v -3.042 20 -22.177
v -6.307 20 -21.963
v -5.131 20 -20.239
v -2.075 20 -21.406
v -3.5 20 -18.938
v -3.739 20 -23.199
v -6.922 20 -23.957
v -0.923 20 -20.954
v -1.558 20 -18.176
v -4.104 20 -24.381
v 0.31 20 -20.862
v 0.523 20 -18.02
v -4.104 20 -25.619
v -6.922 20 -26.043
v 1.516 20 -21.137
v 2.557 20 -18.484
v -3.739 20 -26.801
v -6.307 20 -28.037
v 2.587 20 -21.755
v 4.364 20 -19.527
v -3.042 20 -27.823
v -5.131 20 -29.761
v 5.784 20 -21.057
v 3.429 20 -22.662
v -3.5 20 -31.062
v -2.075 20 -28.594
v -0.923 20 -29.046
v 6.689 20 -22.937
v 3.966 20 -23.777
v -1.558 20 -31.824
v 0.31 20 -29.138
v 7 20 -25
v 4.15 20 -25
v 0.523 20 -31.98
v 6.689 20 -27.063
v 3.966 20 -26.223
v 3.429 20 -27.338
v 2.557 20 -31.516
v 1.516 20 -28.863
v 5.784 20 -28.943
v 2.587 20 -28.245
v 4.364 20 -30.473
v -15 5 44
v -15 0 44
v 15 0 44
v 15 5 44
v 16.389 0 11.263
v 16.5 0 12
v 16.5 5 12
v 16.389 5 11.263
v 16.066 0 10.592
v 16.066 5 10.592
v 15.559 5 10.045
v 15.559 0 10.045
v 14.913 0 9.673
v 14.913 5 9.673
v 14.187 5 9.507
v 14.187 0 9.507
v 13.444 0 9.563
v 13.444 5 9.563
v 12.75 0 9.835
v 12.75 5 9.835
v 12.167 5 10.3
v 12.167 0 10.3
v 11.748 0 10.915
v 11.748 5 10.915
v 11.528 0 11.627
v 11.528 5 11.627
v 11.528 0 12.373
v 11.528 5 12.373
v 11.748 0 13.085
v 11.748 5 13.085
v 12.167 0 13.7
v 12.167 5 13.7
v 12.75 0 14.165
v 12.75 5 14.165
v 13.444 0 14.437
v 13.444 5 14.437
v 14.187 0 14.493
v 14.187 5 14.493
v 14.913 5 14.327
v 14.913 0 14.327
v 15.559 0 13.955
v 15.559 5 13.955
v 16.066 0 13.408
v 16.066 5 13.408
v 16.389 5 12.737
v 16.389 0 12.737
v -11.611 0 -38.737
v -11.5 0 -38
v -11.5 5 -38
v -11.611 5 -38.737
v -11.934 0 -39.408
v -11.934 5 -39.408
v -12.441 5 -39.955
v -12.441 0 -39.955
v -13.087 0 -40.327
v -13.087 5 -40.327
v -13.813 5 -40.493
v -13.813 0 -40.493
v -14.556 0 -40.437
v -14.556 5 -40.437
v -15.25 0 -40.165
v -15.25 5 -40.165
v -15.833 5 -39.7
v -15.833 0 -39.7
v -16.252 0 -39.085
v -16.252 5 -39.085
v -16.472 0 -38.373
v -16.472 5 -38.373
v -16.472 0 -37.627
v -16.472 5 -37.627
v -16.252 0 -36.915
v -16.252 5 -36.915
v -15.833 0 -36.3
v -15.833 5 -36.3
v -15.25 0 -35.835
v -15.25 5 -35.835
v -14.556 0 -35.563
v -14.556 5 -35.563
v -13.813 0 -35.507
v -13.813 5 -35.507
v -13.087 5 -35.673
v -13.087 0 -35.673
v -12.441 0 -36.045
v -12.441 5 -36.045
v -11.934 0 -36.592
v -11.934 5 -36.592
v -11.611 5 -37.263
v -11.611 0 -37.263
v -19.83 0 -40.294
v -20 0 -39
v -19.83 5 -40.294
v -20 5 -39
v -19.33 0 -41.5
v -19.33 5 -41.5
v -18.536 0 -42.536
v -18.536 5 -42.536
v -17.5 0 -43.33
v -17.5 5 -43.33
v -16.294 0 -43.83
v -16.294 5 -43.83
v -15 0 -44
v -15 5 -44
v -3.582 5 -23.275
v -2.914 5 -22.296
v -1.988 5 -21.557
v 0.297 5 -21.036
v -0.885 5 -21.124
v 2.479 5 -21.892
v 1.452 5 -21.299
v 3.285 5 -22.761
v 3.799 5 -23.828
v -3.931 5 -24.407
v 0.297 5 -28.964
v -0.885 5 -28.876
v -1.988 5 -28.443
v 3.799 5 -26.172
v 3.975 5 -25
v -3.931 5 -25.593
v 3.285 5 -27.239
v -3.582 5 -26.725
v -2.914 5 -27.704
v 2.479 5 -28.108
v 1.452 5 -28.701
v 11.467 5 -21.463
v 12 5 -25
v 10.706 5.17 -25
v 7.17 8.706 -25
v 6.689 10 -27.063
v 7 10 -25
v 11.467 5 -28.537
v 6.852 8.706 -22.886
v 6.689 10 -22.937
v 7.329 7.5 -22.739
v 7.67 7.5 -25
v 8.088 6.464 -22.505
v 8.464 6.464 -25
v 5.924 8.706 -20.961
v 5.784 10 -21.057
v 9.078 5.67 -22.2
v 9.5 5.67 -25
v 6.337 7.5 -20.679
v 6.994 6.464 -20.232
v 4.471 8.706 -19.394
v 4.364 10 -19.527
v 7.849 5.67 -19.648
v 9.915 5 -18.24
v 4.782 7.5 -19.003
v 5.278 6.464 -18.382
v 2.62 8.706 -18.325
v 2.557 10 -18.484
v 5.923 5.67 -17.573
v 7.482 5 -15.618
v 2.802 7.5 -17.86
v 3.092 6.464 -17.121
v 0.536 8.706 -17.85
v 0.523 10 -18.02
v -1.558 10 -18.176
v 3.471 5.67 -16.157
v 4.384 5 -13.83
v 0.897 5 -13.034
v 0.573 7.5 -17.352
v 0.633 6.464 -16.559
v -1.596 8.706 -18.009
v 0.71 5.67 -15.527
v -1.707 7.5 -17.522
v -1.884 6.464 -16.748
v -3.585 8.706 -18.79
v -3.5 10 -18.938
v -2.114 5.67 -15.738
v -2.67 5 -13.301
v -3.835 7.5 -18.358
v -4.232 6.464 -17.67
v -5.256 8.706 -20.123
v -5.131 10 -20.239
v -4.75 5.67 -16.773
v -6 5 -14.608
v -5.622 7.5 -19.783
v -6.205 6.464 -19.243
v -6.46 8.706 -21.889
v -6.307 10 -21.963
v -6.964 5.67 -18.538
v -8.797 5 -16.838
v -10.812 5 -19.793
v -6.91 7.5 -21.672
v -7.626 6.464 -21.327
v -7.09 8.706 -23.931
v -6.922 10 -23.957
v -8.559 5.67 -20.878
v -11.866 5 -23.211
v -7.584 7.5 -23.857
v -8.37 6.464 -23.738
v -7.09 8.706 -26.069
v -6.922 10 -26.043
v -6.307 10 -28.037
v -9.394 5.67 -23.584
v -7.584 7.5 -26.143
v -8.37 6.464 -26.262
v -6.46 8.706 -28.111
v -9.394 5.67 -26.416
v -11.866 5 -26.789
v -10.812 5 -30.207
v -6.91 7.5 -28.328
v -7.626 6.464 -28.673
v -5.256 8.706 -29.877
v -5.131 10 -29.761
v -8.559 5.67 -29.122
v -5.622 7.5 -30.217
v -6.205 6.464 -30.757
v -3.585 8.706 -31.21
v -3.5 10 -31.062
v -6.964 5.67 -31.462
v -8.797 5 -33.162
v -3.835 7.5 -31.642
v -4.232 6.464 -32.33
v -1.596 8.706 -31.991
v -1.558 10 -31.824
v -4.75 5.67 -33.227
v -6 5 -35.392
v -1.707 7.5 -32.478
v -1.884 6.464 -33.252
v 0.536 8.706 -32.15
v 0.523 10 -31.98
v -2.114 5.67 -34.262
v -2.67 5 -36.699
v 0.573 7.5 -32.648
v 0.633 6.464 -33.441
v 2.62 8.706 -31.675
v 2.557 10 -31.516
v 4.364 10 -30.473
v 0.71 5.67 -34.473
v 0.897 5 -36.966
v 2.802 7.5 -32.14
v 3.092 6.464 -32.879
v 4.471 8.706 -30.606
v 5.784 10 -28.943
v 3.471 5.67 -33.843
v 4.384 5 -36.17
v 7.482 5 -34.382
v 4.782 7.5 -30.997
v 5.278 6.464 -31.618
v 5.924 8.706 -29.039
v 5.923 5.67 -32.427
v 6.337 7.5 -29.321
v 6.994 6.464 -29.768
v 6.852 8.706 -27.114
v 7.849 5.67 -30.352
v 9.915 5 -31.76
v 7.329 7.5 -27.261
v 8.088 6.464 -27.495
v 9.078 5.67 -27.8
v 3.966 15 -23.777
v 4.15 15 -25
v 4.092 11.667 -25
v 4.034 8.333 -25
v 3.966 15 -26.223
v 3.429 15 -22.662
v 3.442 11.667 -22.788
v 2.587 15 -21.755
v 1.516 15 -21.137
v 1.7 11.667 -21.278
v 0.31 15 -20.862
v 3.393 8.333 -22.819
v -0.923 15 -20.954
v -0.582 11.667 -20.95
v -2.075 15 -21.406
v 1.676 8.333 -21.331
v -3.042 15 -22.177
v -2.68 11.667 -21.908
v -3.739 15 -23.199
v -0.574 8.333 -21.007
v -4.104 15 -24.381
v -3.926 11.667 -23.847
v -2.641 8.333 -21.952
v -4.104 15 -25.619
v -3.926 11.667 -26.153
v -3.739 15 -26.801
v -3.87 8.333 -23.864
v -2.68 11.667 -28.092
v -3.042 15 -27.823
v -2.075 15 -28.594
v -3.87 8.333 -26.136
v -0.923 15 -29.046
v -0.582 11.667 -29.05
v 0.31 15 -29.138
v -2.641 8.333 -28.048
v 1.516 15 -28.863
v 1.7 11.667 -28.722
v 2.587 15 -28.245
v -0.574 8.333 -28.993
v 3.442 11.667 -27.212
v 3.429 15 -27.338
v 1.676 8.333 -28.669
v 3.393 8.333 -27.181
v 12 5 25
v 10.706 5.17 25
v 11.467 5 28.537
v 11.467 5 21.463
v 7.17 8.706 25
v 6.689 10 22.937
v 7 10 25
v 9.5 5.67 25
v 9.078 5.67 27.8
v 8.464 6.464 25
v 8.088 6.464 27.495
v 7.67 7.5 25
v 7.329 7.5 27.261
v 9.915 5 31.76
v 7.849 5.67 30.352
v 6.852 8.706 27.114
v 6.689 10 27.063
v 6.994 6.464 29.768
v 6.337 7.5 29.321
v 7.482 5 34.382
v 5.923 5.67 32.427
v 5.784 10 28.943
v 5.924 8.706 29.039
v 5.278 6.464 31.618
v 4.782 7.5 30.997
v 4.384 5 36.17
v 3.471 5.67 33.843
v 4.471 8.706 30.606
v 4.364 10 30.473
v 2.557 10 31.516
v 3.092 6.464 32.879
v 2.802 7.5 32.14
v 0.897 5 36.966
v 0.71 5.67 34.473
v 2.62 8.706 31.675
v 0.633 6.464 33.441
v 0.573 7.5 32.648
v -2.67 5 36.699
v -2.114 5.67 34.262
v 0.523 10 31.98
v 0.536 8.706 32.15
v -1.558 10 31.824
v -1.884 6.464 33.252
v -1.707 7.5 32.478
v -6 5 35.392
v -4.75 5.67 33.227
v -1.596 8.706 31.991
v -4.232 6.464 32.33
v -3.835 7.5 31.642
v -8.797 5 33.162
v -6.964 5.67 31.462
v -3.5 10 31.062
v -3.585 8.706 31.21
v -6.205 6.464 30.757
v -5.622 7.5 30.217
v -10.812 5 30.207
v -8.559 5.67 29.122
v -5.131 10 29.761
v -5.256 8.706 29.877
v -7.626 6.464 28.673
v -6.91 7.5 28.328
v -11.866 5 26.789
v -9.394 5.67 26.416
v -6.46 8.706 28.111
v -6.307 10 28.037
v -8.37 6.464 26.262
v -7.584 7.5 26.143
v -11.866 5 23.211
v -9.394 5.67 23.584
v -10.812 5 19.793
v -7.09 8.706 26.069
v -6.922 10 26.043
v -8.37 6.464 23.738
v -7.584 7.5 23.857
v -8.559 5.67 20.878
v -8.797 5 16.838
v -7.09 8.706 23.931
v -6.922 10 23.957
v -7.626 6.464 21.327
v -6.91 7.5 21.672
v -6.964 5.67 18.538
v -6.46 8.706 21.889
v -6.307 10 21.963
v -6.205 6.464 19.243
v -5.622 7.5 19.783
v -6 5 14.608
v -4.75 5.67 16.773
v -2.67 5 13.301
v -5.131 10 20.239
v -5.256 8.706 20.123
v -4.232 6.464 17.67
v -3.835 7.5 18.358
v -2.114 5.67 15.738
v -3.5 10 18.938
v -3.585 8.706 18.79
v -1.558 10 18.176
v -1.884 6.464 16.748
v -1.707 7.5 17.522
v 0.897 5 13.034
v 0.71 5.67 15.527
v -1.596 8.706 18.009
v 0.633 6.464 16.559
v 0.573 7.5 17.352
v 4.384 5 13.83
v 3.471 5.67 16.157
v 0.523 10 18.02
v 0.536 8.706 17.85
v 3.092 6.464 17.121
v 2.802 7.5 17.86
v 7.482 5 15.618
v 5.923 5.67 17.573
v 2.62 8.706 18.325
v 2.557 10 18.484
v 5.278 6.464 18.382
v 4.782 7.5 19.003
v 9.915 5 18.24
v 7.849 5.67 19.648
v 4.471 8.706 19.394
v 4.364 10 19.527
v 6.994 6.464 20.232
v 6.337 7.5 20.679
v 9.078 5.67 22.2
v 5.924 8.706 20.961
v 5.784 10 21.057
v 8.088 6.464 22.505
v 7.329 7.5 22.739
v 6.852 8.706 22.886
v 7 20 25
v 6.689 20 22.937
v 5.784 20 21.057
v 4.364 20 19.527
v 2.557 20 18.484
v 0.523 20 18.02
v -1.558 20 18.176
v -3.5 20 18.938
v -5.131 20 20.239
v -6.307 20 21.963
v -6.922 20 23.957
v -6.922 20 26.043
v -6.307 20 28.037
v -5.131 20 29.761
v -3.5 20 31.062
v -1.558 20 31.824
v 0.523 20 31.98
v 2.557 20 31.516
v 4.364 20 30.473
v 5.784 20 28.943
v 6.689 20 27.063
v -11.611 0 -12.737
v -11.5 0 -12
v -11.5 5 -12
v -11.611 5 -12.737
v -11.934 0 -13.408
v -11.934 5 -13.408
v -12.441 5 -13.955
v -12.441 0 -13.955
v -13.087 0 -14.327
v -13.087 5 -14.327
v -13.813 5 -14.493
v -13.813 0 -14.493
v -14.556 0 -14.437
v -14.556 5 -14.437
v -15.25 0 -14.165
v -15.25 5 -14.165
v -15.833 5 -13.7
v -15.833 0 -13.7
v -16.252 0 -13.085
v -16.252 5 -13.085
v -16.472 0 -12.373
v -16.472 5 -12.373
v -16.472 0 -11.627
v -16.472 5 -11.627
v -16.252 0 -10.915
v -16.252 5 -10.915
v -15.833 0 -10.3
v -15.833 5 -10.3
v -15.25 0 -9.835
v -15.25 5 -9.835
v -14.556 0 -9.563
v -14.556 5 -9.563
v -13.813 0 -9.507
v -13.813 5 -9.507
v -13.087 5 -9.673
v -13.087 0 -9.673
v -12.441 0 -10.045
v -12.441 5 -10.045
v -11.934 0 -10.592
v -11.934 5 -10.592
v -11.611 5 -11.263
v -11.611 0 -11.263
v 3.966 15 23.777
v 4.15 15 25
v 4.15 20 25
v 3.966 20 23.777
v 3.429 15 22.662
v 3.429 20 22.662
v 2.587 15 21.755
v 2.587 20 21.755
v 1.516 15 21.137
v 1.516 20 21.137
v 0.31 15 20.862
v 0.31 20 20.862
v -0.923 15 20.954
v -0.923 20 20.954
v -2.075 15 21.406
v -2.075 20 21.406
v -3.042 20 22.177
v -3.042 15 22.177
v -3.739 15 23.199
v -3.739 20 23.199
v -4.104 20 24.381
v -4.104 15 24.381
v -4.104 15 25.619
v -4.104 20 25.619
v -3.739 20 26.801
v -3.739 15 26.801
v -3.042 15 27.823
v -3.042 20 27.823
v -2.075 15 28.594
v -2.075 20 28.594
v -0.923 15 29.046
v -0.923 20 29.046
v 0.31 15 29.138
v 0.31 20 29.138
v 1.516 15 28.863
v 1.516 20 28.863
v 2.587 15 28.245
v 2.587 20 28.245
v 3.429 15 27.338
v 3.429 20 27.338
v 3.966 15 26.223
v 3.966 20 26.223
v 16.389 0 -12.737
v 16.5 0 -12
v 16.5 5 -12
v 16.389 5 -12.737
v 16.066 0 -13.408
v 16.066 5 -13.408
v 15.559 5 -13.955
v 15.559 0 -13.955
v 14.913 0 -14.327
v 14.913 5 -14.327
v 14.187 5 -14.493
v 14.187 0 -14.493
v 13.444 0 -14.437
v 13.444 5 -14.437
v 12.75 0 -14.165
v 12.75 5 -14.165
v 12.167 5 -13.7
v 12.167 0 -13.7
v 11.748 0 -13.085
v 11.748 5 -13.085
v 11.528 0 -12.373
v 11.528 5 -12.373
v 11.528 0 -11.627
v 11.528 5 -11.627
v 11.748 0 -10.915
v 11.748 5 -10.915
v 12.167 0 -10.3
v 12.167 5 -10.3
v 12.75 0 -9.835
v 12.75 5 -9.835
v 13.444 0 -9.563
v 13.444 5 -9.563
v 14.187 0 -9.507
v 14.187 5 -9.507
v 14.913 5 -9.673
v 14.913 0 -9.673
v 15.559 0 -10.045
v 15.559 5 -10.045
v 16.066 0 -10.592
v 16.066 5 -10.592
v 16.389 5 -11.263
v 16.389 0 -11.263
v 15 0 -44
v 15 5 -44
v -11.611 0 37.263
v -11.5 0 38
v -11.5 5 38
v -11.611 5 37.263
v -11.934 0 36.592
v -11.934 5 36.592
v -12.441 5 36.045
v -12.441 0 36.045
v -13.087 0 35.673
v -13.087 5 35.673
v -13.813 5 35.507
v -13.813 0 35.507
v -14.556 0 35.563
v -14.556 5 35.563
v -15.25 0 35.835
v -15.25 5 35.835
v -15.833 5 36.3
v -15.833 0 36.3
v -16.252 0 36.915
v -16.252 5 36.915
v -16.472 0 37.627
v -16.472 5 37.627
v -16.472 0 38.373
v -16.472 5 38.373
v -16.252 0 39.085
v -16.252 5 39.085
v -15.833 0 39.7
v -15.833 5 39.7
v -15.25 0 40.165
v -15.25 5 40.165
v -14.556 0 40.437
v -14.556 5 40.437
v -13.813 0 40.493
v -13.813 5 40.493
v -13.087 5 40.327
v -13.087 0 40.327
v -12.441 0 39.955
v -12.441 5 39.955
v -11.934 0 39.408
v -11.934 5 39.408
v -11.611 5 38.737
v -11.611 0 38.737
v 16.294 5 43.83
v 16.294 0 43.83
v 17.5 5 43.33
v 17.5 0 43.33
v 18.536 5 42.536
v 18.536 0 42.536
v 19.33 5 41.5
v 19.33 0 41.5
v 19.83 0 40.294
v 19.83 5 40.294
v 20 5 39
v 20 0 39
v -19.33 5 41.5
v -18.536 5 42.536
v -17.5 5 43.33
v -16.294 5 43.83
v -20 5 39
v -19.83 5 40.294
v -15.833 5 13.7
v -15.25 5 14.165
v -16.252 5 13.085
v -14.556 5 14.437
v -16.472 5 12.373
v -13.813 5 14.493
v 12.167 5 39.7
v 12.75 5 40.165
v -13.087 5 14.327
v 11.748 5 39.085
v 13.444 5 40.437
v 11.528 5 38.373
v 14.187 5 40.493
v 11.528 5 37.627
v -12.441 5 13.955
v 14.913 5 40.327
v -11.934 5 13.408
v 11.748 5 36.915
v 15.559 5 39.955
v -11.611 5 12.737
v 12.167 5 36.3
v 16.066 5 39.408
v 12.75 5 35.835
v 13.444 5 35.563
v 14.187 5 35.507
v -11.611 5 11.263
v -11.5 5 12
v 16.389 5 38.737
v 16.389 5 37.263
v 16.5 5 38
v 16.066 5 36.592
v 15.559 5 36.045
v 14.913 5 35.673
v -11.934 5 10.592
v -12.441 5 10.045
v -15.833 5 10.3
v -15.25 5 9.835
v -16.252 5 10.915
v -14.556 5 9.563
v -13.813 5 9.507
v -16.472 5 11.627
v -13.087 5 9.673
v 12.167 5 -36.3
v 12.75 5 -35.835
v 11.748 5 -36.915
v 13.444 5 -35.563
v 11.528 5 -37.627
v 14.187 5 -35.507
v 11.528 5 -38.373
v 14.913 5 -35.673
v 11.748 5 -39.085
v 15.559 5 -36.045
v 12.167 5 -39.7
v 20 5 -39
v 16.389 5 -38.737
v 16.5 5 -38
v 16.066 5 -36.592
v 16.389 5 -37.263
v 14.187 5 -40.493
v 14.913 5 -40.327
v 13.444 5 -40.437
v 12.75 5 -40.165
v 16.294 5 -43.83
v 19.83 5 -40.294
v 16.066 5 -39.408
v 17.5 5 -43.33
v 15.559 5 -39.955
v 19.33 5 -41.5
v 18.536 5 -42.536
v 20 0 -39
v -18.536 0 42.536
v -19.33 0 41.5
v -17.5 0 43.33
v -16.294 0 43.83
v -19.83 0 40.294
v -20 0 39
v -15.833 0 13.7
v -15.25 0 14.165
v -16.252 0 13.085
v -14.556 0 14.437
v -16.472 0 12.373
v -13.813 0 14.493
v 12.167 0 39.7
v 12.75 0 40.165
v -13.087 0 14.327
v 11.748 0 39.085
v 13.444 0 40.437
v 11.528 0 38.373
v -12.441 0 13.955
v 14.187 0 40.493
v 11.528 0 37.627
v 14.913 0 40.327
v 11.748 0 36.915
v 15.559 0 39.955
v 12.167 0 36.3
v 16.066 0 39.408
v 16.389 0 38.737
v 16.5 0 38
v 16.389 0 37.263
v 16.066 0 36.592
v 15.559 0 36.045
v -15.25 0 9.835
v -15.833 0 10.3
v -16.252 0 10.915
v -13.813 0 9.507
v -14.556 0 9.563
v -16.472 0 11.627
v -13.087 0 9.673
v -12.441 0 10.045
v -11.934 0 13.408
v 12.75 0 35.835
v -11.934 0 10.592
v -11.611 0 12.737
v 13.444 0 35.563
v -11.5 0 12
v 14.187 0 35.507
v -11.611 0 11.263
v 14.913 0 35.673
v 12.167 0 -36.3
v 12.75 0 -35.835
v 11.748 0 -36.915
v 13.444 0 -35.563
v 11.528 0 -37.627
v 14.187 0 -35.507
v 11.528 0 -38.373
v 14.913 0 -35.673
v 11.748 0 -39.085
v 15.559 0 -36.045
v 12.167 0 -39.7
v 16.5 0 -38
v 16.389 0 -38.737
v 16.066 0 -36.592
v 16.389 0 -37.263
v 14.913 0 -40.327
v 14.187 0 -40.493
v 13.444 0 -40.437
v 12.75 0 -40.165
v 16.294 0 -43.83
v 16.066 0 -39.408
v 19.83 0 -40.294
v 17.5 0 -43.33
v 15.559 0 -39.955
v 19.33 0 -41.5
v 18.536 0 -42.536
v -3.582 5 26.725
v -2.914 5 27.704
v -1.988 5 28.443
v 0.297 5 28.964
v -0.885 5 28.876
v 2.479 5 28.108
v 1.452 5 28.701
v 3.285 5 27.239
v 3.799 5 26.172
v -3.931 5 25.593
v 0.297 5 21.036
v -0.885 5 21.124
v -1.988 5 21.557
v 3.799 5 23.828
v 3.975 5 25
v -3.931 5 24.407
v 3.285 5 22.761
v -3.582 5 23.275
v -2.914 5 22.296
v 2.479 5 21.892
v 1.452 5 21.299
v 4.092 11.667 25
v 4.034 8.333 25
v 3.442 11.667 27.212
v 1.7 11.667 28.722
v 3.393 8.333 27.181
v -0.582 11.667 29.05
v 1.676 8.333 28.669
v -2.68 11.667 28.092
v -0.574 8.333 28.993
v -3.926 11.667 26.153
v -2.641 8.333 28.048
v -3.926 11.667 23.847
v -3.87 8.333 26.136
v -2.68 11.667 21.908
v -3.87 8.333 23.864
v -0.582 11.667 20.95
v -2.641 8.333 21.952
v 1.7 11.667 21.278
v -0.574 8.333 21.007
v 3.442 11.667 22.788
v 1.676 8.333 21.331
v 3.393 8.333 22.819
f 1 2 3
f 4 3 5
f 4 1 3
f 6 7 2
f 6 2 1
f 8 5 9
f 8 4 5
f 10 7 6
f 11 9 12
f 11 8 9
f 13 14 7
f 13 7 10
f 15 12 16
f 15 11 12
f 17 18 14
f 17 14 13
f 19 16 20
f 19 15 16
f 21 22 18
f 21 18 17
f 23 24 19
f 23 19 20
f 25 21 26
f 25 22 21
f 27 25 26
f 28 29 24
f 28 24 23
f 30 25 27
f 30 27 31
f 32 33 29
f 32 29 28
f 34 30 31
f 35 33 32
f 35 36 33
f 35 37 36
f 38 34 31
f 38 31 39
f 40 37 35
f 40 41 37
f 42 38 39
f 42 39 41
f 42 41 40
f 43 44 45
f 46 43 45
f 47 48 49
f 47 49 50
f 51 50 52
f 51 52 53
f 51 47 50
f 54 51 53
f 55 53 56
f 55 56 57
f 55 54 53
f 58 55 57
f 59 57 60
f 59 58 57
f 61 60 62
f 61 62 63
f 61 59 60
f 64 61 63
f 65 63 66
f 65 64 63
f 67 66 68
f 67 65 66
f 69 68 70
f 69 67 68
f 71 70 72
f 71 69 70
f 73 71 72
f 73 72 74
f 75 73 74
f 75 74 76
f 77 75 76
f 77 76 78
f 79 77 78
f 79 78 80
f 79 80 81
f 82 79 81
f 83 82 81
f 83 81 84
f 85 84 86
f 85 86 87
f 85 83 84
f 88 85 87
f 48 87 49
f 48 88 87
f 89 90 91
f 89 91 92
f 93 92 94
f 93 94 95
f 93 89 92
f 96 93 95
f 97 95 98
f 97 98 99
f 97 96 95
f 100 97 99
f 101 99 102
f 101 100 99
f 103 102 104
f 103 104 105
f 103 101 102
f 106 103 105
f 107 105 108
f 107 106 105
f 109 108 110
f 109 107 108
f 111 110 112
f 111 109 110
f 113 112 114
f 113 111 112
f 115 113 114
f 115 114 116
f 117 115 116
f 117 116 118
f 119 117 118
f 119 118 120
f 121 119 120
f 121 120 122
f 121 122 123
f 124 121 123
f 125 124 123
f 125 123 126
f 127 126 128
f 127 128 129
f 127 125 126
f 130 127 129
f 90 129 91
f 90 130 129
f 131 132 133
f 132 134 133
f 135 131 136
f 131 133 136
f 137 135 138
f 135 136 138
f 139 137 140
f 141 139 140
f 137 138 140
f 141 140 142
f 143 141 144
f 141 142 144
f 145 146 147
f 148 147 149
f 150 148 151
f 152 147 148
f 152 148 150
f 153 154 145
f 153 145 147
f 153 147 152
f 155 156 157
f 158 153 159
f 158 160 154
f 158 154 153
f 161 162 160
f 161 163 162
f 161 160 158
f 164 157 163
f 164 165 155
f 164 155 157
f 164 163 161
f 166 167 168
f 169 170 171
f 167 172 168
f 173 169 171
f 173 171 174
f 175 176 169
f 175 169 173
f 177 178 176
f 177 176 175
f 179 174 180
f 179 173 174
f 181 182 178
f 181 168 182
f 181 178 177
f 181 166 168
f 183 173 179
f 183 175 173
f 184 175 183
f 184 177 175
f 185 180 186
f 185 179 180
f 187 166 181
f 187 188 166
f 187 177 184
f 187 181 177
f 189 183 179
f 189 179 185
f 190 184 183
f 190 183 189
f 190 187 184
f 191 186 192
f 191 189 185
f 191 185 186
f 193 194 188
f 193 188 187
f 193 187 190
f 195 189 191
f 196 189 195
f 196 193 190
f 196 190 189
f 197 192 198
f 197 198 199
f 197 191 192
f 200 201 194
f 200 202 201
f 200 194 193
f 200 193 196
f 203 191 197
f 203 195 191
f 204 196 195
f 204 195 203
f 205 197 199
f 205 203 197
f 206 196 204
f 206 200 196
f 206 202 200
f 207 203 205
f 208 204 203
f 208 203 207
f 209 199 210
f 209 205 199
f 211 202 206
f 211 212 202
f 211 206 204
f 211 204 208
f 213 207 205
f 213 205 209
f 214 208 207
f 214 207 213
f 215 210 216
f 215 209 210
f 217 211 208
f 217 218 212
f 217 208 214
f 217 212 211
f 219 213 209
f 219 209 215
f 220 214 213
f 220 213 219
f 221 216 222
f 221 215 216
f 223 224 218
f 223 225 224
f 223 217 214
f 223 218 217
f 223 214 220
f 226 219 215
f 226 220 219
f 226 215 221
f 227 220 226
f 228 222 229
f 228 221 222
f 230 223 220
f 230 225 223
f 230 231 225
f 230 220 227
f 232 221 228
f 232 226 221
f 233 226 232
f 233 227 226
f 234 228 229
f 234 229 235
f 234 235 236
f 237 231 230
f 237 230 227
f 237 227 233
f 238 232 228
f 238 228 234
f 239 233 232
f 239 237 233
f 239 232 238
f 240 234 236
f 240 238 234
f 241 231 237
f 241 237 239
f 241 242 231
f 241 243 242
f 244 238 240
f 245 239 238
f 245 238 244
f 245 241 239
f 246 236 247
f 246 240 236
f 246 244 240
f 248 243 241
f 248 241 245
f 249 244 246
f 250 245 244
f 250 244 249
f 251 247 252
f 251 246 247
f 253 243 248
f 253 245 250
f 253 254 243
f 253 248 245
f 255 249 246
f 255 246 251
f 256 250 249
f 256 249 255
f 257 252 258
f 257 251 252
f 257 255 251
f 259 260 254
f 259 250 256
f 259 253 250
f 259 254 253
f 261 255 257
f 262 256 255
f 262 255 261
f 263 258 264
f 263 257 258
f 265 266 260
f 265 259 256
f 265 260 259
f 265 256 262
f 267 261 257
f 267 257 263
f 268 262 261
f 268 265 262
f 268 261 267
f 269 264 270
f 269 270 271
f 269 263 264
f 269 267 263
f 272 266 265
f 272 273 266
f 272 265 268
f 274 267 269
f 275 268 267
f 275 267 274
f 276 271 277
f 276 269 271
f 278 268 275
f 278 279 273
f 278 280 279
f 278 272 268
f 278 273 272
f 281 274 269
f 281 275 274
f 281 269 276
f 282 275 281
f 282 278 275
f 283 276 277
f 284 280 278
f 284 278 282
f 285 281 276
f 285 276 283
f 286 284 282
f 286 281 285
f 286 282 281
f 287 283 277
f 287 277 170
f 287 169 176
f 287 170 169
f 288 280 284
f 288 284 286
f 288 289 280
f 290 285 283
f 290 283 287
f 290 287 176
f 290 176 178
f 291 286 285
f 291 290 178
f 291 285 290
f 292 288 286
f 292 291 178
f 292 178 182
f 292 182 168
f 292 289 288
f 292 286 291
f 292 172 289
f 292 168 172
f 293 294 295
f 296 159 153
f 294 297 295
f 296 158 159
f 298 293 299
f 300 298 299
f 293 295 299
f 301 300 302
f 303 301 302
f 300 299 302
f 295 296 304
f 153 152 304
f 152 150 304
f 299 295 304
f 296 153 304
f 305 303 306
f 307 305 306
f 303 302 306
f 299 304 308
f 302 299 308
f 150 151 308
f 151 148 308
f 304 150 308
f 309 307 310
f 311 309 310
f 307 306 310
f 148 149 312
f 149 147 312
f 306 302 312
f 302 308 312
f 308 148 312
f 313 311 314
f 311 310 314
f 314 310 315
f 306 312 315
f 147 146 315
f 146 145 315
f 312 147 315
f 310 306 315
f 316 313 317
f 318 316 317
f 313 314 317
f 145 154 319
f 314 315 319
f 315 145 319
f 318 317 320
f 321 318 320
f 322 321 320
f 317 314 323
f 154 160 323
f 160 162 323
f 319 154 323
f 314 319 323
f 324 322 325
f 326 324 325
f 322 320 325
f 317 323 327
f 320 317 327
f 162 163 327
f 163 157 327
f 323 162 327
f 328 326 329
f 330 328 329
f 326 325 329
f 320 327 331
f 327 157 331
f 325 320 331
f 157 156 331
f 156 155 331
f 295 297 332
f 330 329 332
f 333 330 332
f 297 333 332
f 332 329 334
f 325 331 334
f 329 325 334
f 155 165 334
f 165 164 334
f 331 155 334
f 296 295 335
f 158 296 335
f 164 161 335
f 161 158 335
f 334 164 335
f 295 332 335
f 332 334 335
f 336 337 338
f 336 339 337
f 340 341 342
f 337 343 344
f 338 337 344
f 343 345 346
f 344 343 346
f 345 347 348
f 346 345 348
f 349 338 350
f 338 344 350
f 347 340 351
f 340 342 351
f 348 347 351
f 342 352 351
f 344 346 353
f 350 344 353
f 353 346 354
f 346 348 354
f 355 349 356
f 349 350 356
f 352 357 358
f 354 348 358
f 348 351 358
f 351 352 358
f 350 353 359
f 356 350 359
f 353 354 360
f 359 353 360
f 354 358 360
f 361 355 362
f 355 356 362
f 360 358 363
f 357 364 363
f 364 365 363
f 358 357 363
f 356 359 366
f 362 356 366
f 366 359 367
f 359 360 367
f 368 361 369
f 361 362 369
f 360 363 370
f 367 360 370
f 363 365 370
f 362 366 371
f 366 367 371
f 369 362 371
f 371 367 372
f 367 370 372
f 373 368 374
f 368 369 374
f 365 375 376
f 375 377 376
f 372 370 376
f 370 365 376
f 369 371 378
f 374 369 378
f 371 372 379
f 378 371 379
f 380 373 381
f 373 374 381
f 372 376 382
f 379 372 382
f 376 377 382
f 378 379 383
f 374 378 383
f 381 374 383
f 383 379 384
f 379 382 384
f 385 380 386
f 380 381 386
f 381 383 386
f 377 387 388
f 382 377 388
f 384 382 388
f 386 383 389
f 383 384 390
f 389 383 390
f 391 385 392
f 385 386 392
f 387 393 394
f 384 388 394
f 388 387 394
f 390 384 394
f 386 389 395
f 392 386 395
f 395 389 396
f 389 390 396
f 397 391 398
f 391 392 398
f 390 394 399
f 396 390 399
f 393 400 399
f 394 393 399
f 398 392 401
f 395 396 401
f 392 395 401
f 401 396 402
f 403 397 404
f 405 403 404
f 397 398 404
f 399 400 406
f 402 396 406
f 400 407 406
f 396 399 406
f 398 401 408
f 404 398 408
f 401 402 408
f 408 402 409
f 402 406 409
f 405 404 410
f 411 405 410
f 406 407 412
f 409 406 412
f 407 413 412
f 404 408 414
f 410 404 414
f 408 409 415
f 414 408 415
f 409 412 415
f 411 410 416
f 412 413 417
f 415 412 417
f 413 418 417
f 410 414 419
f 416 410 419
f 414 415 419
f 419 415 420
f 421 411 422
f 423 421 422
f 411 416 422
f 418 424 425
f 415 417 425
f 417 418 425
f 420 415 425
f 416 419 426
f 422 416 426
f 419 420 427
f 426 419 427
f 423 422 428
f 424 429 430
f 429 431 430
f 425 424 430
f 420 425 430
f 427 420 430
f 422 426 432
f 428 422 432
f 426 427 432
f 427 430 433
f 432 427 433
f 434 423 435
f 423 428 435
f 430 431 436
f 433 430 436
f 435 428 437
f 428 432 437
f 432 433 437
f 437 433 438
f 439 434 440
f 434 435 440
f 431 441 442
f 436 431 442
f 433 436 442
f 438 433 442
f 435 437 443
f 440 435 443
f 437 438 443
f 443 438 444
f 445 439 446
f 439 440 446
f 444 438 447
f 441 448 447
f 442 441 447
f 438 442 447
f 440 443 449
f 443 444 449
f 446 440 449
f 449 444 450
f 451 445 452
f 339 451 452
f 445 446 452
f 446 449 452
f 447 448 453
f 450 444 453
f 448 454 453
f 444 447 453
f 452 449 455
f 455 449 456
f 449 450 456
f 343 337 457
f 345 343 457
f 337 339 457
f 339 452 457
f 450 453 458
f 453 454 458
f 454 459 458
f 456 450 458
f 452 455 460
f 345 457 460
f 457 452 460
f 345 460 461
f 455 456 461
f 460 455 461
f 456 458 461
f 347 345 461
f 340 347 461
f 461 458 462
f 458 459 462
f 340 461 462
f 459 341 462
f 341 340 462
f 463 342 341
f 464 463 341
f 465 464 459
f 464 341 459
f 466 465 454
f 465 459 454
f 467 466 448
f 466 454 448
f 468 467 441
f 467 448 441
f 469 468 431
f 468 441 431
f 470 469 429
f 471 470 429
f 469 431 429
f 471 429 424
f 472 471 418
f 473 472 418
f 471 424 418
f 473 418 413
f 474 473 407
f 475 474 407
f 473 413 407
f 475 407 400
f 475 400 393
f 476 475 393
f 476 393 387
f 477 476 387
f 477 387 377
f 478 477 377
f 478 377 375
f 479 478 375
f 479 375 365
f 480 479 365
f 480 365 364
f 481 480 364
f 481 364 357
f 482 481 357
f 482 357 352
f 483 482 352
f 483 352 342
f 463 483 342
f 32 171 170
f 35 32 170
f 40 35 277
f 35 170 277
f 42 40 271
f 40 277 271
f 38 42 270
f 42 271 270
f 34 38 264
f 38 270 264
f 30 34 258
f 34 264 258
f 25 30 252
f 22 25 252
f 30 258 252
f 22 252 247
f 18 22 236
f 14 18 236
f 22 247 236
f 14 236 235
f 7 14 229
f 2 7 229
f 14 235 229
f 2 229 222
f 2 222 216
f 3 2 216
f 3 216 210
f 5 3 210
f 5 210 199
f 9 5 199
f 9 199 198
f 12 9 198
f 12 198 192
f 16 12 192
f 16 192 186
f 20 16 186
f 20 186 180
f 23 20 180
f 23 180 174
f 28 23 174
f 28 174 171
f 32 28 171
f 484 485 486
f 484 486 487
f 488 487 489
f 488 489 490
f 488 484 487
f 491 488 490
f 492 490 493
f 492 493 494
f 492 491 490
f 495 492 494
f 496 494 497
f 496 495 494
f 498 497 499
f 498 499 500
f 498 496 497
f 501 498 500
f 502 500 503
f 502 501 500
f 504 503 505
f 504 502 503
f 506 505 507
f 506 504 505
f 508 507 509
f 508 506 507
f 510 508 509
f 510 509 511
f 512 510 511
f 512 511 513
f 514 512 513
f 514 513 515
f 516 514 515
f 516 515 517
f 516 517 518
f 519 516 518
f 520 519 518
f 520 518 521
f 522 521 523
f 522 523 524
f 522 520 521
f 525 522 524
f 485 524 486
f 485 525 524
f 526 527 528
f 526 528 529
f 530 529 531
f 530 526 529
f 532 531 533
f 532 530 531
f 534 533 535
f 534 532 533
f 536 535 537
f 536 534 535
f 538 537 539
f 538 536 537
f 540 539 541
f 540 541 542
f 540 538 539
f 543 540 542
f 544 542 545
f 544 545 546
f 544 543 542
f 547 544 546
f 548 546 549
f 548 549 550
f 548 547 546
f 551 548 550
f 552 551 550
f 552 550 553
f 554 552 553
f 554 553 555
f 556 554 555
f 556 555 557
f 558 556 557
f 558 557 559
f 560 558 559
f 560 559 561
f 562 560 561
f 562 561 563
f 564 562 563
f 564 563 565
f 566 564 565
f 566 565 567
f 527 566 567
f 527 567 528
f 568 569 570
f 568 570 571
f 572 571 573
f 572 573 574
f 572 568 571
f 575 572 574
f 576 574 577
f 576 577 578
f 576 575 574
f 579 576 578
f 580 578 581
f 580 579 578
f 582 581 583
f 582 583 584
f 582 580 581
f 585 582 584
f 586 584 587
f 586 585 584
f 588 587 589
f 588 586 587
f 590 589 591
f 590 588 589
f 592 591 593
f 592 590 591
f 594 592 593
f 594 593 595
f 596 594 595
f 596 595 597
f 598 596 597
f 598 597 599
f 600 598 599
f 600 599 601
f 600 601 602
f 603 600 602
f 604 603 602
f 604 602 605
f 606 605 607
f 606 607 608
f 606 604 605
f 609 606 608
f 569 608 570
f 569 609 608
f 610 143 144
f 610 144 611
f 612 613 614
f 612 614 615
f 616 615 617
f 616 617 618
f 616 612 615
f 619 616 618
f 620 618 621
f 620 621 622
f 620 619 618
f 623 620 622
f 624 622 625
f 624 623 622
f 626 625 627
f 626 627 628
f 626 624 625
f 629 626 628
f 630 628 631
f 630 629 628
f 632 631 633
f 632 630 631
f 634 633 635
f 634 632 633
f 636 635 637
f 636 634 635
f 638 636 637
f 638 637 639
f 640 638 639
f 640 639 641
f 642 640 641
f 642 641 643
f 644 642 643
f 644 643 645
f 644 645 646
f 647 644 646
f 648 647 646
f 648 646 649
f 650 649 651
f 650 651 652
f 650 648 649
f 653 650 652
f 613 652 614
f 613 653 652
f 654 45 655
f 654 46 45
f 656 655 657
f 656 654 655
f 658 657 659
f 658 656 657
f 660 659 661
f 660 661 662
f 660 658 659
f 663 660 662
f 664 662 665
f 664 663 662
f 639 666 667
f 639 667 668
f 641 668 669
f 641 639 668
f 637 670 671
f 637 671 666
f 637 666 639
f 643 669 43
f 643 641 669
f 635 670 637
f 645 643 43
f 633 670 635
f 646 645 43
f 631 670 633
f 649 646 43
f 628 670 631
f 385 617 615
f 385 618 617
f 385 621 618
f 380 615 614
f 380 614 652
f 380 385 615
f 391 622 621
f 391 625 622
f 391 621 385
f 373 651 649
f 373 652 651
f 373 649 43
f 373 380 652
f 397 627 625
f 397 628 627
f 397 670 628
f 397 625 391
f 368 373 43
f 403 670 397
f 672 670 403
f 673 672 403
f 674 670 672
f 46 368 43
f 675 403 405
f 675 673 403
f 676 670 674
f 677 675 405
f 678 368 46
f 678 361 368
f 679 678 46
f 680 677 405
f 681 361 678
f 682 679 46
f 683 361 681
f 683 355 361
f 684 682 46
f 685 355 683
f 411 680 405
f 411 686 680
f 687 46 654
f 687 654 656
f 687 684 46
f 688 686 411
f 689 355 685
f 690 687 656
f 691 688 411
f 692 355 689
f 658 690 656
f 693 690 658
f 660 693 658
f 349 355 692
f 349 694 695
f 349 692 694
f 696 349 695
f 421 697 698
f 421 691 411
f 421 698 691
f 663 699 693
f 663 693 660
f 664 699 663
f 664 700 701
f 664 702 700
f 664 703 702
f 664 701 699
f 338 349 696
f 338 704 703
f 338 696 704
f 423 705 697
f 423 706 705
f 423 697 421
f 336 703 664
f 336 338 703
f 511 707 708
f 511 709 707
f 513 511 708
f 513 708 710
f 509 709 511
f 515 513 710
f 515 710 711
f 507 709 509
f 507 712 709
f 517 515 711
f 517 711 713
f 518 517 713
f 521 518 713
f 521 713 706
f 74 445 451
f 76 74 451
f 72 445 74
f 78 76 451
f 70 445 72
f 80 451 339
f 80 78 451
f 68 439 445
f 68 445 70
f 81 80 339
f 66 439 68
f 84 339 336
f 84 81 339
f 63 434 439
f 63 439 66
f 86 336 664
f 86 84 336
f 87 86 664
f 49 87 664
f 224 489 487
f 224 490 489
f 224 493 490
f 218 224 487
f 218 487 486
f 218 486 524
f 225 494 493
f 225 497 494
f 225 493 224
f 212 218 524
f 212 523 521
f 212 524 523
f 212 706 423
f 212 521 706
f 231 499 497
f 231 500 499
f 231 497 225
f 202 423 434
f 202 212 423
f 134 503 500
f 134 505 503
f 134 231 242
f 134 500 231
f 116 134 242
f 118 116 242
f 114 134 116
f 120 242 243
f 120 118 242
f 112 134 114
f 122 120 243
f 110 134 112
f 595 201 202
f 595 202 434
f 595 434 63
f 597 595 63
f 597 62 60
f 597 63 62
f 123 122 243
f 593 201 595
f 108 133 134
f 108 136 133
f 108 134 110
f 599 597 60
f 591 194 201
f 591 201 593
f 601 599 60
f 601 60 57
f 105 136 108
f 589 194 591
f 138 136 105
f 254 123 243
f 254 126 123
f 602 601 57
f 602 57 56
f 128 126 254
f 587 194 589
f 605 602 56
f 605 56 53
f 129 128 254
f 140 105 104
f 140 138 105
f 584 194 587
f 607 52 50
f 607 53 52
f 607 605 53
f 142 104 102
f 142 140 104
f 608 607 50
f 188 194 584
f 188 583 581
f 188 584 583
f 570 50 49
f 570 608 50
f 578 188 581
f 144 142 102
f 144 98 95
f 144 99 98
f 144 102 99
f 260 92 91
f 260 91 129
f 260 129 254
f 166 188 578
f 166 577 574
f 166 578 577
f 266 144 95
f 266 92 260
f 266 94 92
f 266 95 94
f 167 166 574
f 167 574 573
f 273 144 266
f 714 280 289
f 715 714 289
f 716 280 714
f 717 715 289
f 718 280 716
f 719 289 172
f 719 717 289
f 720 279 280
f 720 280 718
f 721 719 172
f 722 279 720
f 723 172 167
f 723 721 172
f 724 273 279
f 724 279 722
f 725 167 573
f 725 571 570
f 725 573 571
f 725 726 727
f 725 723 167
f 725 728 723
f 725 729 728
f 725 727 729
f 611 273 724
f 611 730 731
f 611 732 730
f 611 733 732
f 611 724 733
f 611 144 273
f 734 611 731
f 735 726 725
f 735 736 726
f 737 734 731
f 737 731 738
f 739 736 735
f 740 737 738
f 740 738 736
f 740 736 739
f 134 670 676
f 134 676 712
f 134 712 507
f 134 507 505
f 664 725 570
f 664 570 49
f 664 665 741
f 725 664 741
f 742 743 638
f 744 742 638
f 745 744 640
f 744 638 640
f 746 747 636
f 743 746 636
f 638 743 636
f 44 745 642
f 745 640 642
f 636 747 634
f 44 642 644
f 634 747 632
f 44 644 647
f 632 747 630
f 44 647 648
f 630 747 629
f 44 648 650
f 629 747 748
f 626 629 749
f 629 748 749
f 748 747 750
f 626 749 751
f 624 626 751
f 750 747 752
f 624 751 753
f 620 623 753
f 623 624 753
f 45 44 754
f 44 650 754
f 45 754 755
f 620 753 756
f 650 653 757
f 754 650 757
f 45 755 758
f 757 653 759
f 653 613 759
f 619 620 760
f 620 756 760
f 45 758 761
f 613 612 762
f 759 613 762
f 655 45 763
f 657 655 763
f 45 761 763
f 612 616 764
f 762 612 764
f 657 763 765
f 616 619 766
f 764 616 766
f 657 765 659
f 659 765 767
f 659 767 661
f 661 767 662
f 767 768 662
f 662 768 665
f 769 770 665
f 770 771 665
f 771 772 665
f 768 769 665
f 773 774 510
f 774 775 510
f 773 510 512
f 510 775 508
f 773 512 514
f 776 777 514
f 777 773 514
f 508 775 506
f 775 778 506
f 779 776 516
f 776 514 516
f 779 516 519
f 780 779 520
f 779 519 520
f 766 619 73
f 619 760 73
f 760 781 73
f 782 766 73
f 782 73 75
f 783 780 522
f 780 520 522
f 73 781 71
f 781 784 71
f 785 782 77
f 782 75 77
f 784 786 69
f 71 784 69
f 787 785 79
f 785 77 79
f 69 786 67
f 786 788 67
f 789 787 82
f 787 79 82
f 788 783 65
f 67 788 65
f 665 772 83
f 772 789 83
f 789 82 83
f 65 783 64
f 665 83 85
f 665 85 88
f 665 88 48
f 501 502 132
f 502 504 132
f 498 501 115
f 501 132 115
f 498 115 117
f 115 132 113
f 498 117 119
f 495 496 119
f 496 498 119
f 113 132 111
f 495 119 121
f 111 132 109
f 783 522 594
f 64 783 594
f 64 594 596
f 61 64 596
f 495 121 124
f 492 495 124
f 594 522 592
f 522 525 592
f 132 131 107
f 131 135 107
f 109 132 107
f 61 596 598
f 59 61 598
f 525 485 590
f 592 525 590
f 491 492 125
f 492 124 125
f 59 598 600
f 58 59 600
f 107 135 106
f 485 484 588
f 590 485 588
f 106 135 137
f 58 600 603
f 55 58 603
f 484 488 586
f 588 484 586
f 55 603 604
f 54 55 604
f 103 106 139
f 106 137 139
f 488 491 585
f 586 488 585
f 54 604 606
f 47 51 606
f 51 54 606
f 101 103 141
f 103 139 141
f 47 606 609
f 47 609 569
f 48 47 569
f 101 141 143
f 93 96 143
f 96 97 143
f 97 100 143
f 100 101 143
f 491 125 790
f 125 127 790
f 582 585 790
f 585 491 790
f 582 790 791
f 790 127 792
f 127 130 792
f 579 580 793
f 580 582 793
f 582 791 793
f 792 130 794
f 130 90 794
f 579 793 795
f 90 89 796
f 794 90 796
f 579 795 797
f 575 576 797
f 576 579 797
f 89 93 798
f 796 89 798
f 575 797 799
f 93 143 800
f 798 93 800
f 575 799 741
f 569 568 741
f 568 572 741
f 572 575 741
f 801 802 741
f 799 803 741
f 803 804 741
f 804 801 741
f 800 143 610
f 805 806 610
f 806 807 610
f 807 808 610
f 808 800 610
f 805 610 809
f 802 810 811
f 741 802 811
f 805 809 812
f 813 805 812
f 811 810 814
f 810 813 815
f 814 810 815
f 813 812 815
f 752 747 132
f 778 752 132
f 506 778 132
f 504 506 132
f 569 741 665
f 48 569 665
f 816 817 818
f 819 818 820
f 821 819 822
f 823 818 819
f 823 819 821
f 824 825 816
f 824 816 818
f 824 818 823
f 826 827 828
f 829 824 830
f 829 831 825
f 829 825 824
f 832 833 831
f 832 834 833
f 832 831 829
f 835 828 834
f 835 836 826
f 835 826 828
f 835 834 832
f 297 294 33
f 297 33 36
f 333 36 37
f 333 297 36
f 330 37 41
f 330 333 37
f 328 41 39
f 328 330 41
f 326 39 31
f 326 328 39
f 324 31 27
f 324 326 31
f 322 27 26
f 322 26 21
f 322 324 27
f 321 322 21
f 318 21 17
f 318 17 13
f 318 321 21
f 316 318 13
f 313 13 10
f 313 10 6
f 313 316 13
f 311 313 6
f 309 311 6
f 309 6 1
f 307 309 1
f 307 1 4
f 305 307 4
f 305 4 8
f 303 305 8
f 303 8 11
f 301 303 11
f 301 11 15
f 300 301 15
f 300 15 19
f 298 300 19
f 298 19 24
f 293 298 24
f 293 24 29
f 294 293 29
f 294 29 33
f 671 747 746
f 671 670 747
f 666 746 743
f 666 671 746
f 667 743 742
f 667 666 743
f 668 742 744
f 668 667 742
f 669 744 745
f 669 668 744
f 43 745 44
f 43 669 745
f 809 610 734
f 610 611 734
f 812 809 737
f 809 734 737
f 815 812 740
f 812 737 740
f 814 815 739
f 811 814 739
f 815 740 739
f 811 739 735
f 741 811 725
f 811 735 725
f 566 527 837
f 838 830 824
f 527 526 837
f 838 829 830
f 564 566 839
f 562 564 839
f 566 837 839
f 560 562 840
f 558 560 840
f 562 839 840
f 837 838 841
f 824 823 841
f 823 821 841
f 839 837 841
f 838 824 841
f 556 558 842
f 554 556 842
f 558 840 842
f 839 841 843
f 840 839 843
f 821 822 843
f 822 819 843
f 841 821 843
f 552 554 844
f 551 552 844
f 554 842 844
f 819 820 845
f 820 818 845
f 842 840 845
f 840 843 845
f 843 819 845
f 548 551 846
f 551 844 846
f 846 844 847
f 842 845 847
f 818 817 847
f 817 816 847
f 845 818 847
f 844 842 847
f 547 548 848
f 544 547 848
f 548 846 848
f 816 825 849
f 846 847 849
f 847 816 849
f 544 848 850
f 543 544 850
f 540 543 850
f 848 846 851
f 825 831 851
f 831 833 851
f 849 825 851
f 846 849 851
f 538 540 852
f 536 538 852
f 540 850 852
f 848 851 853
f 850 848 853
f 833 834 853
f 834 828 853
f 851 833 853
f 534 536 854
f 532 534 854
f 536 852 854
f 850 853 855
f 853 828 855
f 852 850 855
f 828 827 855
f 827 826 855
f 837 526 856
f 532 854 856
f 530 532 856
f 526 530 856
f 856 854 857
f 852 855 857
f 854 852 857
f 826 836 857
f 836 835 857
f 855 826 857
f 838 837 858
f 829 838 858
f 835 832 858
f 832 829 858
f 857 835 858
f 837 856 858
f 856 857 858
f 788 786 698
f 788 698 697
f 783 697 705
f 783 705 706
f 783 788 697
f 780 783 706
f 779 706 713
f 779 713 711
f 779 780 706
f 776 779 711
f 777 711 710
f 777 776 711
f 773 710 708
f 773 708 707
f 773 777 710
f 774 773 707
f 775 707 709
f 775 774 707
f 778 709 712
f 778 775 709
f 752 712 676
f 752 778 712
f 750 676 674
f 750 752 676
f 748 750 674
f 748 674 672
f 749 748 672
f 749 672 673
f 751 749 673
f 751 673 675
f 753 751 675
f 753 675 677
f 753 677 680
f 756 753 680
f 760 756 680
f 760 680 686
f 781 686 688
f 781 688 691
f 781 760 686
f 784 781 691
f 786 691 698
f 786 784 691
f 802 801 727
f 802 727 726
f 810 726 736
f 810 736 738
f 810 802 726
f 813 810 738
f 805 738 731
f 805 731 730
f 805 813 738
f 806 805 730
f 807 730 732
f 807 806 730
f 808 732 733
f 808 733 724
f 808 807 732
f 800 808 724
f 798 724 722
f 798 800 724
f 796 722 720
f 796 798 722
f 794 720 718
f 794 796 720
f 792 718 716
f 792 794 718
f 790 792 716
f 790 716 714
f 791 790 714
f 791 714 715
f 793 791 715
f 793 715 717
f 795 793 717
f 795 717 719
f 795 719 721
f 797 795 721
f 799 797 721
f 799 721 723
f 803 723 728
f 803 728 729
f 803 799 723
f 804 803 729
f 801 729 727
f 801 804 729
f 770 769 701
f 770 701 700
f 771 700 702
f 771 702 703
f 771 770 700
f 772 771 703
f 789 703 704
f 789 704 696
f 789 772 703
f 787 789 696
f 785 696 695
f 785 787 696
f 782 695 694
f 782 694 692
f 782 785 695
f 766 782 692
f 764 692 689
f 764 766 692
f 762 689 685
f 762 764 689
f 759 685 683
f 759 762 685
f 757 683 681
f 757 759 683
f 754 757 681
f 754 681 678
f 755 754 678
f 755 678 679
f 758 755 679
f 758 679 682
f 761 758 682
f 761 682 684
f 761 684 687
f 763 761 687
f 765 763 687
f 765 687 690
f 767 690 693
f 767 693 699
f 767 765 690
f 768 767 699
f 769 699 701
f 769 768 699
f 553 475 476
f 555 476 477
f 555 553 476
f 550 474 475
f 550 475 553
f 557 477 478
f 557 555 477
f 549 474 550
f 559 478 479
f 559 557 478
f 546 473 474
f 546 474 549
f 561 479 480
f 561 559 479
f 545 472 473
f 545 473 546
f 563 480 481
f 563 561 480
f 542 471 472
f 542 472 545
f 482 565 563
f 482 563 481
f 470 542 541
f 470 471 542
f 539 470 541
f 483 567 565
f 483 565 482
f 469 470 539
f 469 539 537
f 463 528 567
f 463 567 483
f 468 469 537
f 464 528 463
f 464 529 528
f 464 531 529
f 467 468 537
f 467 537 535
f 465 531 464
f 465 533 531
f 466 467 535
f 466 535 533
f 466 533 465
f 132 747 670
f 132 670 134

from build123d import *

# Parameters (mm, degrees)
SKETCH1_W             = 40
SKETCH1_H             = 88
SKETCH1_R             = 2.5
BOSS_EXTRUDE1_DEPTH   = 5
SKETCH2_R             = 7
SKETCH2_R_2           = 4.15
BOSS_EXTRUDE2_DEPTH   = 20
CHAMFER1_SIZE         = 10
CHAMFER1_SIZE2        = 0.174550649
CHAMFER1_PART_2_SIZE  = 10
CHAMFER1_PART_2_SIZE2 = 0.174550649
FILLET1_R             = 5


with BuildPart() as part:
    # Sketch1 → Boss-Extrude1 (new body)
    with BuildSketch(Plane(origin=(0, 0, 0), x_dir=(1, 0, 0), z_dir=(0, 1, 0))):
        Rectangle(SKETCH1_W, SKETCH1_H)
        with Locations((-14, 38)):
            Circle(SKETCH1_R, mode=Mode.SUBTRACT)
        with Locations((14, 38)):
            Circle(SKETCH1_R, mode=Mode.SUBTRACT)
        with Locations((-14, 12)):
            Circle(SKETCH1_R, mode=Mode.SUBTRACT)
        with Locations((14, 12)):
            Circle(SKETCH1_R, mode=Mode.SUBTRACT)
        with Locations((-14, -12)):
            Circle(SKETCH1_R, mode=Mode.SUBTRACT)
        with Locations((-14, -38)):
            Circle(SKETCH1_R, mode=Mode.SUBTRACT)
        with Locations((14, -38)):
            Circle(SKETCH1_R, mode=Mode.SUBTRACT)
        with Locations((14, -12)):
            Circle(SKETCH1_R, mode=Mode.SUBTRACT)
    extrude(amount=BOSS_EXTRUDE1_DEPTH)

    # Sketch2 → Boss-Extrude2 (add)
    with BuildSketch(Plane(origin=(0, 0, 0), x_dir=(1, 0, 0), z_dir=(0, 1, 0))):
        with Locations((0, 25)):
            Circle(SKETCH2_R)
        with Locations((0, 25)):
            Circle(SKETCH2_R_2, mode=Mode.SUBTRACT)
        with Locations((0, -25)):
            Circle(SKETCH2_R)
        with Locations((0, -25)):
            Circle(SKETCH2_R_2, mode=Mode.SUBTRACT)
    extrude(amount=BOSS_EXTRUDE2_DEPTH)

    # Chamfer1
    chamfer1_edges = [part.edges().sort_by_distance(p)[0] for p in [
        (-4.15, 5, 25),
    ]]
    chamfer1_side = [part.faces().sort_by_distance(p)[0] for p in [
        (-4.15, 12.5, 25),
    ]]
    chamfer(chamfer1_edges, length=CHAMFER1_SIZE, length2=CHAMFER1_SIZE2, reference=chamfer1_side[0])

    # Chamfer1 part 2
    chamfer1_part_2_edges = [part.edges().sort_by_distance(p)[0] for p in [
        (-4.15, 5, -25),
    ]]
    chamfer1_part_2_side = [part.faces().sort_by_distance(p)[0] for p in [
        (-4.15, 12.5, -25),
    ]]
    chamfer(chamfer1_part_2_edges, length=CHAMFER1_PART_2_SIZE, length2=CHAMFER1_PART_2_SIZE2, reference=chamfer1_part_2_side[0])

    # Fillet1
    fillet1_edges = [part.edges().sort_by_distance(p)[0] for p in [
        (-7, 5, 25),
        (-7, 5, -25),
        (-20, 2.5, -44),
        (20, 2.5, -44),
        (20, 2.5, 44),
        (-20, 2.5, 44),
    ]]
    fillet(fillet1_edges, radius=FILLET1_R)


solid = part.part
